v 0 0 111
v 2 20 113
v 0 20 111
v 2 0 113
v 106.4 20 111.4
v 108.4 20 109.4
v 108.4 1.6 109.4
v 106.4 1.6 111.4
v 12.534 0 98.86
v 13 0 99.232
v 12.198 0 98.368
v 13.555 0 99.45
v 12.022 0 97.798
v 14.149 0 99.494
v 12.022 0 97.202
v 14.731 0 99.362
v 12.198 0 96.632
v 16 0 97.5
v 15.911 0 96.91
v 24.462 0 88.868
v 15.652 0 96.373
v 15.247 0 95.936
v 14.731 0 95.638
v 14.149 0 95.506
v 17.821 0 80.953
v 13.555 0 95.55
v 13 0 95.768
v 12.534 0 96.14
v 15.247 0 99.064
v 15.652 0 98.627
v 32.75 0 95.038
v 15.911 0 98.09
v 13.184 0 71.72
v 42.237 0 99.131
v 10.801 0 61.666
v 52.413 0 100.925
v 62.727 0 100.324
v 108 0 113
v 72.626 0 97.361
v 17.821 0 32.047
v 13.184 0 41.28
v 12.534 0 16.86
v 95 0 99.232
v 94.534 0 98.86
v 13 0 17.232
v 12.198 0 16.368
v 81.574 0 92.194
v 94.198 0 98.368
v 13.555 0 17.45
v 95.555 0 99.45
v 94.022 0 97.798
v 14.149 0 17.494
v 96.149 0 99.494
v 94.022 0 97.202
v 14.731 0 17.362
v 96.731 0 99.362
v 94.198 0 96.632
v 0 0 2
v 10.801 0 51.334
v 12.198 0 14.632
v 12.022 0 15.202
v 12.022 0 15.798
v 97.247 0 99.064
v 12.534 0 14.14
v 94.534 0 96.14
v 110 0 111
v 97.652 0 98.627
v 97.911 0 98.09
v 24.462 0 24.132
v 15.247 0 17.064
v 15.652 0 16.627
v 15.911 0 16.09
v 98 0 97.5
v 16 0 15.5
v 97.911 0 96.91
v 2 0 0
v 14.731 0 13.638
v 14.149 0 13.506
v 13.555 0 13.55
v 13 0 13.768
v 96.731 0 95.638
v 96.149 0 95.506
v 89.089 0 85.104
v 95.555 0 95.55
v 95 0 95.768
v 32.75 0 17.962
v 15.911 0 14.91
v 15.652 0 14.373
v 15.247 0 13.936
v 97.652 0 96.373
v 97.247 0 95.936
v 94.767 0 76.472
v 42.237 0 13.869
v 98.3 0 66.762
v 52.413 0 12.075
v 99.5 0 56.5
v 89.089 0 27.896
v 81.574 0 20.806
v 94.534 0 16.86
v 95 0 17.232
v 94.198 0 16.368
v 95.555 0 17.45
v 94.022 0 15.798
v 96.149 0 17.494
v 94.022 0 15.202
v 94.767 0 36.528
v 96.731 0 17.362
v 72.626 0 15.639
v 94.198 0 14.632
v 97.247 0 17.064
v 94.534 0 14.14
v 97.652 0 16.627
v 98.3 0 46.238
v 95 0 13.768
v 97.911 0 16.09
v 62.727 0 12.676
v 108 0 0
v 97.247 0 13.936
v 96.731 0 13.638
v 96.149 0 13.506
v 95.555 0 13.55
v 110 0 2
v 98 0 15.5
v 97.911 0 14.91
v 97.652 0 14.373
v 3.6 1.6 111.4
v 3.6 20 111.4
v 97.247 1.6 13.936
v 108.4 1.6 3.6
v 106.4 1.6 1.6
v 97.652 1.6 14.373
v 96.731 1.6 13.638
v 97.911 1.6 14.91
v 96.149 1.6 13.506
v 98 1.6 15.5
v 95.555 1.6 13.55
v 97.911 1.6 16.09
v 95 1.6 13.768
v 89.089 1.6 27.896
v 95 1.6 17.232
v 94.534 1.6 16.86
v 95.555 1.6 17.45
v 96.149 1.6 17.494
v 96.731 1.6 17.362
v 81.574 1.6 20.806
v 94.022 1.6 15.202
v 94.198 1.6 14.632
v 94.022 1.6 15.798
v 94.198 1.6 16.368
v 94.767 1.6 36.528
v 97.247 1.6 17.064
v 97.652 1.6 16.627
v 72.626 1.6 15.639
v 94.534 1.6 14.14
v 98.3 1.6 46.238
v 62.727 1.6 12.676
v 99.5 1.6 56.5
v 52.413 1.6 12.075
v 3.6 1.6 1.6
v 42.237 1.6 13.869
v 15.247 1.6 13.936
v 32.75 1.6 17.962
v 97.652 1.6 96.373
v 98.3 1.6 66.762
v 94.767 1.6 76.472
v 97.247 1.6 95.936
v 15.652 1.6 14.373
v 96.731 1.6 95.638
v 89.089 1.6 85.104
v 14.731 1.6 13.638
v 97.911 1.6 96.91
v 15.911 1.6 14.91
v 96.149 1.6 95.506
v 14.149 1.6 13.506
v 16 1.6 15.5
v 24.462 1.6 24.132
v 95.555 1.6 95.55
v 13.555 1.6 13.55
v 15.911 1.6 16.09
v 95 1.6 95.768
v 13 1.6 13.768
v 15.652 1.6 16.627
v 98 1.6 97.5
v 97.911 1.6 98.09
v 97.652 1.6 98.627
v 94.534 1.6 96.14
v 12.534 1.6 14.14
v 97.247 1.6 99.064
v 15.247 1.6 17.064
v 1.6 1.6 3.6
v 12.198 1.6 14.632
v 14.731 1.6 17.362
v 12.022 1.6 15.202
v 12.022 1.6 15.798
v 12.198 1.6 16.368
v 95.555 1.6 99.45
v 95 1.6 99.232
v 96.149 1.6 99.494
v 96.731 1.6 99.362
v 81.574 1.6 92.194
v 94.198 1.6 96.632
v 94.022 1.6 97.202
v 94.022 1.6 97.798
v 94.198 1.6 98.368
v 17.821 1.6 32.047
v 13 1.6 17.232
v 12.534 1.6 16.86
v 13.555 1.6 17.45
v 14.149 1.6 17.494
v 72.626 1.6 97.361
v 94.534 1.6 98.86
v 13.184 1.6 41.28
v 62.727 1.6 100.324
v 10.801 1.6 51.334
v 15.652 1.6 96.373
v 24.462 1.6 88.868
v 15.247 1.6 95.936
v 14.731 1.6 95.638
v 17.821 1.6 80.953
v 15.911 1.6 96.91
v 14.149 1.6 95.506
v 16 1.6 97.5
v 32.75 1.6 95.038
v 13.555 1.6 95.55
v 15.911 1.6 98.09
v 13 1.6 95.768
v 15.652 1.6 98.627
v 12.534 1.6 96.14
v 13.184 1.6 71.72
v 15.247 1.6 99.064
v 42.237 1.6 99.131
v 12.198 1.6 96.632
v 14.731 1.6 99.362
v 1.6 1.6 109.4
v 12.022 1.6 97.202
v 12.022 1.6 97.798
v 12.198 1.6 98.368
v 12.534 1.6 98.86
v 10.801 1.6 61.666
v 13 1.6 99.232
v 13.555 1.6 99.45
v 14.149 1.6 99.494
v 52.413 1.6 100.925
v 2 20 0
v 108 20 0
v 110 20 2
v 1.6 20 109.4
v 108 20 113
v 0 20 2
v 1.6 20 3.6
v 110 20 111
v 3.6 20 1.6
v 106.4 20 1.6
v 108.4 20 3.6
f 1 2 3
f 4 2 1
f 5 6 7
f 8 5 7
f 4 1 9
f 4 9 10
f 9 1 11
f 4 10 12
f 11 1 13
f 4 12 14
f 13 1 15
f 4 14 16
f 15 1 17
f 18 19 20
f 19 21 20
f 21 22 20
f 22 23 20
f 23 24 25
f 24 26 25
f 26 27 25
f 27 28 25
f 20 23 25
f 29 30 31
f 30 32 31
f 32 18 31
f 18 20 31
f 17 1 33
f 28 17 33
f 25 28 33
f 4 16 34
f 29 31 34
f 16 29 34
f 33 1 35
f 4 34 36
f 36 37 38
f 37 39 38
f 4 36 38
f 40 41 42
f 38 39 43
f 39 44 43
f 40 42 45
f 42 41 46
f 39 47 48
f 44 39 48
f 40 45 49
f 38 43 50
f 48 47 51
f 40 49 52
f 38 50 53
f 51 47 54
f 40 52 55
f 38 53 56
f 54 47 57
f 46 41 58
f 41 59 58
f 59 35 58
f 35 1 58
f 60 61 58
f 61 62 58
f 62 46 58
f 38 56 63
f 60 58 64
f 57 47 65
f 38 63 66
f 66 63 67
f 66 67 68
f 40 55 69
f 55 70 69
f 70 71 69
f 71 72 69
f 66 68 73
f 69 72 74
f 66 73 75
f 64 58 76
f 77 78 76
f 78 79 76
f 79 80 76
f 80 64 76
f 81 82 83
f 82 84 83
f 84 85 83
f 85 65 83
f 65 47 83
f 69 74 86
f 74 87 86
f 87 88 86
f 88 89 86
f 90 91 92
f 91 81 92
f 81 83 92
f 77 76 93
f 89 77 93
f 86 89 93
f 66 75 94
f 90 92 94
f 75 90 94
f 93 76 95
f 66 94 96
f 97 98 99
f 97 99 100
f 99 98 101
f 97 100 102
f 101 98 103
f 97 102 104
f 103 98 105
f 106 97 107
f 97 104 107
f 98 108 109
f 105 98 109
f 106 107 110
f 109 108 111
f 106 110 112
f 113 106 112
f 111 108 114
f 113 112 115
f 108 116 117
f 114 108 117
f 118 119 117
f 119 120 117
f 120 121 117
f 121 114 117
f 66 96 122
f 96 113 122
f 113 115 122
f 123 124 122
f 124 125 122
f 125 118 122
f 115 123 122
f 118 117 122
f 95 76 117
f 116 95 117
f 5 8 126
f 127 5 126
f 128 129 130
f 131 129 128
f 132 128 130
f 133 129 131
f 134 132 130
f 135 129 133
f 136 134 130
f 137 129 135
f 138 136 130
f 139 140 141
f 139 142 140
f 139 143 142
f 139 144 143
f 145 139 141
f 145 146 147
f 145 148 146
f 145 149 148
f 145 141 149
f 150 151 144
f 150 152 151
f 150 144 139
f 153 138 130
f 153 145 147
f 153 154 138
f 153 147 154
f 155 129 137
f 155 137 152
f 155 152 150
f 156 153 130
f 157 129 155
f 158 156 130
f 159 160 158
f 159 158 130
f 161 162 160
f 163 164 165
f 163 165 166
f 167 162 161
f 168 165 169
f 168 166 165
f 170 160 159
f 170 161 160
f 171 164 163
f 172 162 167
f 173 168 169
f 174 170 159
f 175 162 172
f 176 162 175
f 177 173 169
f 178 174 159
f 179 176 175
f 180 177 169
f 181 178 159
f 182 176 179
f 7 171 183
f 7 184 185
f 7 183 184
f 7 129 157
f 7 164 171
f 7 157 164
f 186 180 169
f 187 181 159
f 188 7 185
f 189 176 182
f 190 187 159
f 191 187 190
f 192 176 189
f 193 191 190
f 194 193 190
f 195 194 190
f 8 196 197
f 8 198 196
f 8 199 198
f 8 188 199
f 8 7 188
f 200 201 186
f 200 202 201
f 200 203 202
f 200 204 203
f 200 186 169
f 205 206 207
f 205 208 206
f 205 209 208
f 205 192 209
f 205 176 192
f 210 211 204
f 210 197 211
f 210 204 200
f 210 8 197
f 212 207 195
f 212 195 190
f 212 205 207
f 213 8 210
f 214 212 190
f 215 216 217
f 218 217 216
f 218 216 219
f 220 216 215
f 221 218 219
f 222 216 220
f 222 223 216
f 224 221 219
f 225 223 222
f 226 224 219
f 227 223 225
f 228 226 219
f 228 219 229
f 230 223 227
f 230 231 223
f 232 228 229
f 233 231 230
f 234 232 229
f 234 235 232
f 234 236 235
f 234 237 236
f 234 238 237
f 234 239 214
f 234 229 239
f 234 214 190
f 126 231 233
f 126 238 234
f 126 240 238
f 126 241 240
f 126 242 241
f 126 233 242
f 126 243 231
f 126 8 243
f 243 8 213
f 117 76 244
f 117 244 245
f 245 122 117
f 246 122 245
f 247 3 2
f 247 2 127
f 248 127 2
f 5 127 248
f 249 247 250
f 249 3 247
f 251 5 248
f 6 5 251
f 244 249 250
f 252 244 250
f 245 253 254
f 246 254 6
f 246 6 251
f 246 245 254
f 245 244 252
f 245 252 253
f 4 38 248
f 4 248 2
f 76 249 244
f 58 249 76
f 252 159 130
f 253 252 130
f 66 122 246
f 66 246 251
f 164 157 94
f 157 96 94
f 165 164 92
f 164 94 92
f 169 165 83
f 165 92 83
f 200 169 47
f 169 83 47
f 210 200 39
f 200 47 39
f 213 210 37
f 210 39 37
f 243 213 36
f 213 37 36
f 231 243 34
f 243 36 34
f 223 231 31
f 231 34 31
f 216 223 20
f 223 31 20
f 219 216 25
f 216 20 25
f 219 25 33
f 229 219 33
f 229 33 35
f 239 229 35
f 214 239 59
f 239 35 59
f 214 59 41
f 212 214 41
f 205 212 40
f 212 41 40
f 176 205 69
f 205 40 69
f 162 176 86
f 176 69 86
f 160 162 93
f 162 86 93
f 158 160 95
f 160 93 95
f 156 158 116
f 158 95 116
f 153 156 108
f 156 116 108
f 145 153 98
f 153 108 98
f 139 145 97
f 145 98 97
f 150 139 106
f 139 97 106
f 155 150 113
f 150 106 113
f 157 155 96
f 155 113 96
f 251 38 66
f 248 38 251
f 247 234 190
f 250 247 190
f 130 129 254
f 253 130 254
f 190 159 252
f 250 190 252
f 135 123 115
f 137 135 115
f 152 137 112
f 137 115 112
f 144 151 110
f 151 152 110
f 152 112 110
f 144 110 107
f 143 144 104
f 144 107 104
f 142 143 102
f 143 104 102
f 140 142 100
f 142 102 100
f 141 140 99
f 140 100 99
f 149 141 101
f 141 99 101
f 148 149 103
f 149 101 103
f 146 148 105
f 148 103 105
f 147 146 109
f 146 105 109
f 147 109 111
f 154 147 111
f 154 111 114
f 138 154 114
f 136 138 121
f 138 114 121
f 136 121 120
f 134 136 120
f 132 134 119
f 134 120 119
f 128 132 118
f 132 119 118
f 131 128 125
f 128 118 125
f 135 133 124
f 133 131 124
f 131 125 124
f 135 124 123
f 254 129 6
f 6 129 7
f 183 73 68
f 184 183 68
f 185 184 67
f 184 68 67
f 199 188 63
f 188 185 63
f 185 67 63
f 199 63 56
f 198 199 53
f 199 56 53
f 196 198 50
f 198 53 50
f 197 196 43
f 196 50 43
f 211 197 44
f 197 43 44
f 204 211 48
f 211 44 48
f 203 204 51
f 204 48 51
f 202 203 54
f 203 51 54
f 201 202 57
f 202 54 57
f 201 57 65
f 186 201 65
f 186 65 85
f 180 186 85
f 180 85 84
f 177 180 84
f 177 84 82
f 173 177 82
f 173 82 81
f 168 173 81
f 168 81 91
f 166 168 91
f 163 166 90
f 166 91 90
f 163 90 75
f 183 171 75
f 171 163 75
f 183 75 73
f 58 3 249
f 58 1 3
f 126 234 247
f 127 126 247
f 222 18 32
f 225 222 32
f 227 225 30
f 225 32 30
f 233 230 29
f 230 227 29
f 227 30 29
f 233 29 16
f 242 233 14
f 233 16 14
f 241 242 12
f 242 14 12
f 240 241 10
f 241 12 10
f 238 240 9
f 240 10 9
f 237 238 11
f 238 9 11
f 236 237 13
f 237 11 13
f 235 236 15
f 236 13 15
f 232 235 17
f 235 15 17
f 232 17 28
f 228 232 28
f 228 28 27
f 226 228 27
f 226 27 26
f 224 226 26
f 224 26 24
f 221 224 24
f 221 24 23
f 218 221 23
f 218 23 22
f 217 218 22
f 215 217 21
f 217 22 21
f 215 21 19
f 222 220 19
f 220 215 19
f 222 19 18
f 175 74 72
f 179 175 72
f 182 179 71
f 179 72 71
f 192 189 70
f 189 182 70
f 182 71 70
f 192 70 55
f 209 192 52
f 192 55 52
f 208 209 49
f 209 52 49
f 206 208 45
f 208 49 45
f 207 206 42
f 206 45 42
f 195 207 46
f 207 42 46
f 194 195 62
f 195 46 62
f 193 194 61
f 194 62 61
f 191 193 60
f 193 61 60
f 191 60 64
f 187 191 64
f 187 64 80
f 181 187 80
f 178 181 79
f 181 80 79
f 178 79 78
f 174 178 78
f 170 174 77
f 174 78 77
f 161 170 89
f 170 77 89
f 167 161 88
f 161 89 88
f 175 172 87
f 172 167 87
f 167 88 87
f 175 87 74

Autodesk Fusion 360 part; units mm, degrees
sketch "Sketch1" plane through (0, 0, 0) normal (0, 1, 0) x (1, 0, 0)
  line L0 (14, -97.5) -> (14, -15.5) construction
  line L1 (14, -15.5) -> (96, -15.5) construction
  line L2 (96, -15.5) -> (96, -97.5) construction
  line L3 (96, -97.5) -> (14, -97.5) construction
  circle A0 centre (96, -15.5) radius 2
  circle A1 centre (14, -15.5) radius 2
  circle A2 centre (14, -97.5) radius 2
  circle A3 centre (96, -97.5) radius 2
  line L4 (0, 0) -> (110, 0)
  line L5 (110, 0) -> (110, -113)
  line L6 (110, -113) -> (0, -113)
  line L7 (0, -113) -> (0, 0)
  line L8 (101, -102.5) -> (9, -102.5)
  line L9 (9, -102.5) -> (9, -10.5)
  line L10 (9, -10.5) -> (101, -10.5)
  line L11 (101, -10.5) -> (101, -102.5)
  line L12 (55, -102.5) -> (55, -113) construction
  line L13 (101, -56.5) -> (110, -56.5) construction
  line L14 (94, -95.5) -> (16, -95.5)
  line L15 (16, -95.5) -> (16, -17.5)
  line L16 (16, -17.5) -> (94, -17.5)
  line L17 (94, -17.5) -> (94, -95.5)
  circle A4 centre (55, -56.5) radius 44.5
  line L18 (14, -97.5) -> (96, -15.5) construction
  line L19 (96, -97.5) -> (14, -15.5) construction
  point P0 (55, -97.5)
  point P1 (55, -102.5)
  point P2 (55, -113)
  point P3 (55, -56.5)
  dimension "d681" = 4
  dimension "d682" = 110
  dimension "d683" = 113
  dimension "d684" = 82
  dimension "d685" = 82
  dimension "d686" = -5
  dimension "d691" = 2
  dimension "d698" = 89
extrude "Extrude1" add sketch "Sketch1" along normal blind 20 contours L4 L5 L6 L7 | L8 L9 L10 L11 | L14 L17 A4 | L14 L15 A4 | L16 L17 A4 | L15 L16 A4
shell "Shell2" thickness 1.6 removed faces 1 at (56.0638, 20, 4.0382)
sketch "Sketch2" plane through (0, 20, 0) normal (0, 1, 0) x (-1, 0, 0)
  circle A0 centre (-96, 97.5) radius 2
  circle A1 centre (-14, 15.5) radius 2
  circle A2 centre (-96, 15.5) radius 2
  circle A3 centre (-14, 97.5) radius 2
  circle A4 centre (-96, 97.5) radius 3.6
  circle A5 centre (-14, 15.5) radius 3.6
  circle A6 centre (-14, 97.5) radius 3.6
  circle A7 centre (-96, 15.5) radius 3.6
  circle A8 centre (-55, 56.5) radius 46.1
  circle A9 centre (-55, 56.5) radius 44.5
  circle A10 centre (-55, 56.5) radius 46.1
extrude "Extrude3" cut sketch "Sketch2" against normal up to surface (18.4 mm away)
chamfer "Chamfer1" distance 2 angle 45 4 edges at (0, 10, 113) (110, 10, 113) (0, 10, 0) (110, 10, 0)
chamfer "Chamfer1" distance 2 angle 45 4 edges at (108.4, 10.8, 1.6) (1.6, 10.8, 1.6) (1.6, 10.8, 111.4) (108.4, 10.8, 111.4)
